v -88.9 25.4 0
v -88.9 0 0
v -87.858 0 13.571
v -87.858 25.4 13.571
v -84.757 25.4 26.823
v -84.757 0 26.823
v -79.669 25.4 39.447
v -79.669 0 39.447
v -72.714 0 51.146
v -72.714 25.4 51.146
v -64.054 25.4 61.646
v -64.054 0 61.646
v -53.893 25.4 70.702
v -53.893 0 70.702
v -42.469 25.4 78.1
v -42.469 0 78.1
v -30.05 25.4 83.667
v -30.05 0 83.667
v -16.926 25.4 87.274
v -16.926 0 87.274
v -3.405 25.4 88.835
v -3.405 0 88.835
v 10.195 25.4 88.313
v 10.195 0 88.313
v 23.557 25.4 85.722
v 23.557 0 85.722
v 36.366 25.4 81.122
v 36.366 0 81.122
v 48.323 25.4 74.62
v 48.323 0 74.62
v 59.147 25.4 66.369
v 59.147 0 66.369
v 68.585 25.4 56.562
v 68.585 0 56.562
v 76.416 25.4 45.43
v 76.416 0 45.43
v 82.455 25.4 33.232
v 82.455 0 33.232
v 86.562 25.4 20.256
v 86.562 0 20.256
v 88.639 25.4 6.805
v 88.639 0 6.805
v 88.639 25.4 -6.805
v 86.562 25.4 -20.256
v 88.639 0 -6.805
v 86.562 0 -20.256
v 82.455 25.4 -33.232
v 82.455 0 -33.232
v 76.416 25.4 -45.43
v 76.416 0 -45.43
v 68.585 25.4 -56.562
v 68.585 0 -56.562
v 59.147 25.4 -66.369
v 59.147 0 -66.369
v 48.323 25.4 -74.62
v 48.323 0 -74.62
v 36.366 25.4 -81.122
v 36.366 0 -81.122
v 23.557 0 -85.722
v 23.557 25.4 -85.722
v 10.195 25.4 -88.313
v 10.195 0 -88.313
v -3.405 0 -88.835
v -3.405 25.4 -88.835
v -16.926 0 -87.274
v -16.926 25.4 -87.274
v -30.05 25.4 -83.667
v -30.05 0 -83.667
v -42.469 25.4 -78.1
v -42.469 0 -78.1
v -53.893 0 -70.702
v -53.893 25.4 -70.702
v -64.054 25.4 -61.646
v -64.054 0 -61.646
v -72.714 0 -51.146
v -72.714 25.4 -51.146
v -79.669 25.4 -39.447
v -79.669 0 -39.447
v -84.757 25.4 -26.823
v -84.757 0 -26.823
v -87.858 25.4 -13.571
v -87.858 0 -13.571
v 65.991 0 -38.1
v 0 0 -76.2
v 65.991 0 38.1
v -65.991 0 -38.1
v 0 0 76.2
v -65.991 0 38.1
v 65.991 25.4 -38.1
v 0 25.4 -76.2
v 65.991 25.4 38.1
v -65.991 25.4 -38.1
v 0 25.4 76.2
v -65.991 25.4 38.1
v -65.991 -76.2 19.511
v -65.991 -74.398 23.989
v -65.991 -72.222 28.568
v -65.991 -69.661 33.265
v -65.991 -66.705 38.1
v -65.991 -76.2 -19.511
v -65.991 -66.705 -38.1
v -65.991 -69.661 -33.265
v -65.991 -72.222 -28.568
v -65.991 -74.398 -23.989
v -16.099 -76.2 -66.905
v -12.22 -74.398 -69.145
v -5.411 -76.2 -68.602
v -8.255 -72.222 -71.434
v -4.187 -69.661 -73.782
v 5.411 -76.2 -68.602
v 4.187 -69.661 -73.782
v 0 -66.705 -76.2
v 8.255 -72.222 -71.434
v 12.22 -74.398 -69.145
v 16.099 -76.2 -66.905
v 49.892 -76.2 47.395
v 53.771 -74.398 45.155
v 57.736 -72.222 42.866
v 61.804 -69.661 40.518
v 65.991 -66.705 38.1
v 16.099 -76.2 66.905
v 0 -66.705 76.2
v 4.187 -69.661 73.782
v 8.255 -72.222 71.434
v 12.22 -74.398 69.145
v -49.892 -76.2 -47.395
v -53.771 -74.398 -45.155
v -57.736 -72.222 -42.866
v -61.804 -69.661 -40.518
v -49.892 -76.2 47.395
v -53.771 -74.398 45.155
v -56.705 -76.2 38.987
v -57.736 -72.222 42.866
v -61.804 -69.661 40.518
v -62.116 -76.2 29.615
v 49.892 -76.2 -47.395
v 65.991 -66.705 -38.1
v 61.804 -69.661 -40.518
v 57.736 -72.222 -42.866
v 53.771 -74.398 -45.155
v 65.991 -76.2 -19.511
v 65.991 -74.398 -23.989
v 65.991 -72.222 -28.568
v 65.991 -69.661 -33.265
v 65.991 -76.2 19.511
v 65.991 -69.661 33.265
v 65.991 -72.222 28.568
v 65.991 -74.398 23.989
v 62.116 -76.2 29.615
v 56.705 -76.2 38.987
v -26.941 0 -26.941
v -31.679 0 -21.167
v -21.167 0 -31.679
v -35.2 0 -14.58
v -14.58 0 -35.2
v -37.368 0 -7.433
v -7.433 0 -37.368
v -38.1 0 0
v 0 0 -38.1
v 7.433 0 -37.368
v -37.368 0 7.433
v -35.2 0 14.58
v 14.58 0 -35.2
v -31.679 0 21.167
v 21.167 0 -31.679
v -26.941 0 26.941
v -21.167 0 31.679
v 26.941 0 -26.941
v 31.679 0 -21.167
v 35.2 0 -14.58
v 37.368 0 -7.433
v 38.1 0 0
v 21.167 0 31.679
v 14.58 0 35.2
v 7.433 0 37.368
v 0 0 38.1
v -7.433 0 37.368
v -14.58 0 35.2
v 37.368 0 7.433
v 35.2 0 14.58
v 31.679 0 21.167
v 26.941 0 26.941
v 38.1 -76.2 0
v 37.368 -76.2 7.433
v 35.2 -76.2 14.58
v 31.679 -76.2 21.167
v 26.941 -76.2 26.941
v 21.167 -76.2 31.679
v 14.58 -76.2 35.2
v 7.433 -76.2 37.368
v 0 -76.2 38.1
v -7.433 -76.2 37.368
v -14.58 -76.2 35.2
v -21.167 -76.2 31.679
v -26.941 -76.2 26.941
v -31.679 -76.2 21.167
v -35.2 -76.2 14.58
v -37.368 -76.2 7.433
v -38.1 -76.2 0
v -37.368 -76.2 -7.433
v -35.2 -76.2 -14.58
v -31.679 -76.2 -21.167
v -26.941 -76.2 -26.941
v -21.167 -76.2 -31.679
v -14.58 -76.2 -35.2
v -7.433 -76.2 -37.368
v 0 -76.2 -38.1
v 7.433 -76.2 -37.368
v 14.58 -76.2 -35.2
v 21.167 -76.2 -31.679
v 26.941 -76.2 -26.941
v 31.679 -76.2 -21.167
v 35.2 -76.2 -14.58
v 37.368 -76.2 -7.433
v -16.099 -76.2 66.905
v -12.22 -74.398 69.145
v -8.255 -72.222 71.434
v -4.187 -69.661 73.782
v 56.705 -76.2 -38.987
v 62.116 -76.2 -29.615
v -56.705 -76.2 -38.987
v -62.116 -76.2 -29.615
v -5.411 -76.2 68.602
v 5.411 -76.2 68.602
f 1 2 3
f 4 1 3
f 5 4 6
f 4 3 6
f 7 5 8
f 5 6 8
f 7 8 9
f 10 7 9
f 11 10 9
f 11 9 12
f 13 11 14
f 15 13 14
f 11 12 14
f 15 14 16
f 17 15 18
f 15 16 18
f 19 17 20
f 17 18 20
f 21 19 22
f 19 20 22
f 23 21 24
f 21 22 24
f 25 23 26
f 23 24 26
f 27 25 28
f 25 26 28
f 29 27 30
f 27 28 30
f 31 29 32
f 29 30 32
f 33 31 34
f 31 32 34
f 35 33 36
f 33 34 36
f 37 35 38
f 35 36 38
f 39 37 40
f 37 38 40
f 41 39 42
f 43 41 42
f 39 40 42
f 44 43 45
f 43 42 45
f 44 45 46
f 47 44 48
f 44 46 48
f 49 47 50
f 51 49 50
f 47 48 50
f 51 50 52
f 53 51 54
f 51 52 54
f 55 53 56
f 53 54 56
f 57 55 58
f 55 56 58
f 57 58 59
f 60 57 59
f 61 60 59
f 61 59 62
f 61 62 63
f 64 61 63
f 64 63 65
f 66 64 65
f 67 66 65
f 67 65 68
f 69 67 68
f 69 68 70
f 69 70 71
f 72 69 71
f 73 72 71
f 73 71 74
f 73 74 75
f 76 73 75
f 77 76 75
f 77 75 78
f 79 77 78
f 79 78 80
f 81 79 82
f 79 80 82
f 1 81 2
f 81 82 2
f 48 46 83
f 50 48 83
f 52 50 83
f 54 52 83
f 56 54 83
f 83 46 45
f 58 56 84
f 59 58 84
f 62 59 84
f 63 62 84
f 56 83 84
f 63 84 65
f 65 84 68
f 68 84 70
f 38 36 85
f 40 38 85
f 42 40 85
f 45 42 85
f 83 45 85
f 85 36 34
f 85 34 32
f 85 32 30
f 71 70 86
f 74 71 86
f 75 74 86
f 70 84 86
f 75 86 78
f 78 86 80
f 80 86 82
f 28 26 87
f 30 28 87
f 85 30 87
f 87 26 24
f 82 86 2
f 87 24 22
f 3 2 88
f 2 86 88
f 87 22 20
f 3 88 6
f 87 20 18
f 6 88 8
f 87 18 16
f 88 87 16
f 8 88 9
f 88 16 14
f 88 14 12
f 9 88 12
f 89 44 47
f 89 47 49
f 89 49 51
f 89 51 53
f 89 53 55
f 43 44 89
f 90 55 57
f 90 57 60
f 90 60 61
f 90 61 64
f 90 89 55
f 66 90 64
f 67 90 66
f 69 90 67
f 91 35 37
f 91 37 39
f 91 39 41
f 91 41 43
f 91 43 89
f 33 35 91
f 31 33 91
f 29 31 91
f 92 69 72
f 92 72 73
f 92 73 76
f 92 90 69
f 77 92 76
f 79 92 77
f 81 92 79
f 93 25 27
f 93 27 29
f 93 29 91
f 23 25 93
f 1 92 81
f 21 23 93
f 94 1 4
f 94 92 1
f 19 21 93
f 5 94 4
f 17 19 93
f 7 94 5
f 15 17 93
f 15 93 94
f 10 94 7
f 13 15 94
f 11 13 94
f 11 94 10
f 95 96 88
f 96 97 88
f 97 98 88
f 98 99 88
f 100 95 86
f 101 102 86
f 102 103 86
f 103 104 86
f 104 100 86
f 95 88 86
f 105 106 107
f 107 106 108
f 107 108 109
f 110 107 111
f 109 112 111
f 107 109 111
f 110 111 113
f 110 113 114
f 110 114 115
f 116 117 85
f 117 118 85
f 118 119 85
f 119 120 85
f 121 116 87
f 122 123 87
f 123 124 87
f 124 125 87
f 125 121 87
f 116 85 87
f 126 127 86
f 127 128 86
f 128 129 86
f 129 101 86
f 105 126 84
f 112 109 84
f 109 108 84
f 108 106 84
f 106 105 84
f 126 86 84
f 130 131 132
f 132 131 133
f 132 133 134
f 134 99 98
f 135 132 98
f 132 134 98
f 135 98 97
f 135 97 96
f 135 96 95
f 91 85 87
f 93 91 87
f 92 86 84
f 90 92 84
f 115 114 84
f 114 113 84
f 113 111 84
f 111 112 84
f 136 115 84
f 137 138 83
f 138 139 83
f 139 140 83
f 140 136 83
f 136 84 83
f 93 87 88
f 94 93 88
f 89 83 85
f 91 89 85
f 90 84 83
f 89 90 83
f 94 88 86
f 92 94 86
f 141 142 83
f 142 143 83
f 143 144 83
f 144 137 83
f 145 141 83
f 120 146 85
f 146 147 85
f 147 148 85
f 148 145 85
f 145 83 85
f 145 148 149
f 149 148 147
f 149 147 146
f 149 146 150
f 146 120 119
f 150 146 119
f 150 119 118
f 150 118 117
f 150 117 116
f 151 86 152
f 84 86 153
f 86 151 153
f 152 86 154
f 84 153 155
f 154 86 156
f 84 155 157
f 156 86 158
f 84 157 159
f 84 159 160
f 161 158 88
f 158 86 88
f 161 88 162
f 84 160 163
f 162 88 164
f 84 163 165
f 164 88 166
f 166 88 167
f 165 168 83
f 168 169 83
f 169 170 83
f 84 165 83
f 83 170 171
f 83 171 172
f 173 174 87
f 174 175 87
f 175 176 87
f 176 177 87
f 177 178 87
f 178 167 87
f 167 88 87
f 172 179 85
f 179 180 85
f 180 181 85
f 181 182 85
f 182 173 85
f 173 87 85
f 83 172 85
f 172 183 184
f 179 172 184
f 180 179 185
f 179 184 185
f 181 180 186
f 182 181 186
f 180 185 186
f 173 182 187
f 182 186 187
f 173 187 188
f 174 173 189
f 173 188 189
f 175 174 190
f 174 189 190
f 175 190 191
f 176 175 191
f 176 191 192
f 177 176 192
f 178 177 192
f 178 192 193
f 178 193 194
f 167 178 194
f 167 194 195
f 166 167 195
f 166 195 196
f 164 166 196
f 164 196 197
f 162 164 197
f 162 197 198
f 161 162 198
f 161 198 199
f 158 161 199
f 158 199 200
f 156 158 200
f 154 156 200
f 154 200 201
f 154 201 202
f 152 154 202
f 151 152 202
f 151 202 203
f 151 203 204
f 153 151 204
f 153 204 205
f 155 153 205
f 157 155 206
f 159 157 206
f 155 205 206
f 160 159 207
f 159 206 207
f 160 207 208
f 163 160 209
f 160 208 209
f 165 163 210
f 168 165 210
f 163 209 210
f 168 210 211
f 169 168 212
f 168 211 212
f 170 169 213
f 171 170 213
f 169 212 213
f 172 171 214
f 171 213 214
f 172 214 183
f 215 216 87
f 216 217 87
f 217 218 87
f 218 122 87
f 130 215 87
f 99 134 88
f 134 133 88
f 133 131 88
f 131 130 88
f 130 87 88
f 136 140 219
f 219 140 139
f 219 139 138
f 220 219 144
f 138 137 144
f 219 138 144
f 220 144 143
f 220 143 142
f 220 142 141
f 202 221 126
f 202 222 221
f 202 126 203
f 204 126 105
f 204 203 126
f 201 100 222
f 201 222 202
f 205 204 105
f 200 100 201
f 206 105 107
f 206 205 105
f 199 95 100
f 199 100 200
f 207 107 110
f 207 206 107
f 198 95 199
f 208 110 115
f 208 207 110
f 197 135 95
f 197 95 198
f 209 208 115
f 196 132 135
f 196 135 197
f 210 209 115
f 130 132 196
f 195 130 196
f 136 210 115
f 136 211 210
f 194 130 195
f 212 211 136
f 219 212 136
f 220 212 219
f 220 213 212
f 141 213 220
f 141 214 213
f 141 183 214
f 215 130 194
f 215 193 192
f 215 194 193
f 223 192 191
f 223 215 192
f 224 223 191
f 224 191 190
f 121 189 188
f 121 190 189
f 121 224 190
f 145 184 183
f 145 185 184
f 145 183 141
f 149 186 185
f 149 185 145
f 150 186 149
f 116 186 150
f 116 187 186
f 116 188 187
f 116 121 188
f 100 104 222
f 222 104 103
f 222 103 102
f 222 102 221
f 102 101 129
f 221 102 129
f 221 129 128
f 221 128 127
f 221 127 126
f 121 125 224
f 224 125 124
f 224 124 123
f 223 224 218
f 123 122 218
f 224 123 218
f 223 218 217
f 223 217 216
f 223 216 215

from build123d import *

# Parameters (mm, degrees)
F1_DEPTH = 76.2
F2_R     = 88.9
F3_DEPTH = 25.4
F4_R     = 38.1
F5_DEPTH = 101.601


with BuildPart() as f1:
    # F0 (on Front) → F1 (new body)
    with BuildSketch(Plane.XZ):
        Polygon((65.991136, 38.1), (0, 76.2), (-65.991136, 38.1), (-65.991136, -38.1), (0, -76.2), (65.991136, -38.1), align=None)
    extrude(amount=F1_DEPTH)

    # F4 (on face) → F5 (cut, through all)
    with BuildSketch(Plane.XZ.offset(76.2)):
        Circle(F4_R)
    extrude(amount=-F5_DEPTH, mode=Mode.SUBTRACT)

    # F6 (on Right) → F7 (revolve, cut)
    with BuildSketch(Plane.YZ):
        Polygon((-79.554103, 79.966761), (-79.4148, 66.314511), (-61.861902, 79.966761), align=None)
    revolve(axis=Axis((0, -76.2, 0), (0, -1, 0)), mode=Mode.SUBTRACT)


with BuildPart() as f3:
    # F2 (on face) → F3 (new body)
    with BuildSketch(Plane(origin=(0, 0, 0), x_dir=(-1, 0, 0), z_dir=(0, 1, 0))):
        Circle(F2_R)
        Polygon((-65.991136, 38.1), (0, 76.2), (65.991136, 38.1), (65.991136, -38.1), (0, -76.2), (-65.991136, -38.1), align=None, mode=Mode.SUBTRACT)
    extrude(amount=F3_DEPTH)


solid = Compound([f1.part, f3.part])
